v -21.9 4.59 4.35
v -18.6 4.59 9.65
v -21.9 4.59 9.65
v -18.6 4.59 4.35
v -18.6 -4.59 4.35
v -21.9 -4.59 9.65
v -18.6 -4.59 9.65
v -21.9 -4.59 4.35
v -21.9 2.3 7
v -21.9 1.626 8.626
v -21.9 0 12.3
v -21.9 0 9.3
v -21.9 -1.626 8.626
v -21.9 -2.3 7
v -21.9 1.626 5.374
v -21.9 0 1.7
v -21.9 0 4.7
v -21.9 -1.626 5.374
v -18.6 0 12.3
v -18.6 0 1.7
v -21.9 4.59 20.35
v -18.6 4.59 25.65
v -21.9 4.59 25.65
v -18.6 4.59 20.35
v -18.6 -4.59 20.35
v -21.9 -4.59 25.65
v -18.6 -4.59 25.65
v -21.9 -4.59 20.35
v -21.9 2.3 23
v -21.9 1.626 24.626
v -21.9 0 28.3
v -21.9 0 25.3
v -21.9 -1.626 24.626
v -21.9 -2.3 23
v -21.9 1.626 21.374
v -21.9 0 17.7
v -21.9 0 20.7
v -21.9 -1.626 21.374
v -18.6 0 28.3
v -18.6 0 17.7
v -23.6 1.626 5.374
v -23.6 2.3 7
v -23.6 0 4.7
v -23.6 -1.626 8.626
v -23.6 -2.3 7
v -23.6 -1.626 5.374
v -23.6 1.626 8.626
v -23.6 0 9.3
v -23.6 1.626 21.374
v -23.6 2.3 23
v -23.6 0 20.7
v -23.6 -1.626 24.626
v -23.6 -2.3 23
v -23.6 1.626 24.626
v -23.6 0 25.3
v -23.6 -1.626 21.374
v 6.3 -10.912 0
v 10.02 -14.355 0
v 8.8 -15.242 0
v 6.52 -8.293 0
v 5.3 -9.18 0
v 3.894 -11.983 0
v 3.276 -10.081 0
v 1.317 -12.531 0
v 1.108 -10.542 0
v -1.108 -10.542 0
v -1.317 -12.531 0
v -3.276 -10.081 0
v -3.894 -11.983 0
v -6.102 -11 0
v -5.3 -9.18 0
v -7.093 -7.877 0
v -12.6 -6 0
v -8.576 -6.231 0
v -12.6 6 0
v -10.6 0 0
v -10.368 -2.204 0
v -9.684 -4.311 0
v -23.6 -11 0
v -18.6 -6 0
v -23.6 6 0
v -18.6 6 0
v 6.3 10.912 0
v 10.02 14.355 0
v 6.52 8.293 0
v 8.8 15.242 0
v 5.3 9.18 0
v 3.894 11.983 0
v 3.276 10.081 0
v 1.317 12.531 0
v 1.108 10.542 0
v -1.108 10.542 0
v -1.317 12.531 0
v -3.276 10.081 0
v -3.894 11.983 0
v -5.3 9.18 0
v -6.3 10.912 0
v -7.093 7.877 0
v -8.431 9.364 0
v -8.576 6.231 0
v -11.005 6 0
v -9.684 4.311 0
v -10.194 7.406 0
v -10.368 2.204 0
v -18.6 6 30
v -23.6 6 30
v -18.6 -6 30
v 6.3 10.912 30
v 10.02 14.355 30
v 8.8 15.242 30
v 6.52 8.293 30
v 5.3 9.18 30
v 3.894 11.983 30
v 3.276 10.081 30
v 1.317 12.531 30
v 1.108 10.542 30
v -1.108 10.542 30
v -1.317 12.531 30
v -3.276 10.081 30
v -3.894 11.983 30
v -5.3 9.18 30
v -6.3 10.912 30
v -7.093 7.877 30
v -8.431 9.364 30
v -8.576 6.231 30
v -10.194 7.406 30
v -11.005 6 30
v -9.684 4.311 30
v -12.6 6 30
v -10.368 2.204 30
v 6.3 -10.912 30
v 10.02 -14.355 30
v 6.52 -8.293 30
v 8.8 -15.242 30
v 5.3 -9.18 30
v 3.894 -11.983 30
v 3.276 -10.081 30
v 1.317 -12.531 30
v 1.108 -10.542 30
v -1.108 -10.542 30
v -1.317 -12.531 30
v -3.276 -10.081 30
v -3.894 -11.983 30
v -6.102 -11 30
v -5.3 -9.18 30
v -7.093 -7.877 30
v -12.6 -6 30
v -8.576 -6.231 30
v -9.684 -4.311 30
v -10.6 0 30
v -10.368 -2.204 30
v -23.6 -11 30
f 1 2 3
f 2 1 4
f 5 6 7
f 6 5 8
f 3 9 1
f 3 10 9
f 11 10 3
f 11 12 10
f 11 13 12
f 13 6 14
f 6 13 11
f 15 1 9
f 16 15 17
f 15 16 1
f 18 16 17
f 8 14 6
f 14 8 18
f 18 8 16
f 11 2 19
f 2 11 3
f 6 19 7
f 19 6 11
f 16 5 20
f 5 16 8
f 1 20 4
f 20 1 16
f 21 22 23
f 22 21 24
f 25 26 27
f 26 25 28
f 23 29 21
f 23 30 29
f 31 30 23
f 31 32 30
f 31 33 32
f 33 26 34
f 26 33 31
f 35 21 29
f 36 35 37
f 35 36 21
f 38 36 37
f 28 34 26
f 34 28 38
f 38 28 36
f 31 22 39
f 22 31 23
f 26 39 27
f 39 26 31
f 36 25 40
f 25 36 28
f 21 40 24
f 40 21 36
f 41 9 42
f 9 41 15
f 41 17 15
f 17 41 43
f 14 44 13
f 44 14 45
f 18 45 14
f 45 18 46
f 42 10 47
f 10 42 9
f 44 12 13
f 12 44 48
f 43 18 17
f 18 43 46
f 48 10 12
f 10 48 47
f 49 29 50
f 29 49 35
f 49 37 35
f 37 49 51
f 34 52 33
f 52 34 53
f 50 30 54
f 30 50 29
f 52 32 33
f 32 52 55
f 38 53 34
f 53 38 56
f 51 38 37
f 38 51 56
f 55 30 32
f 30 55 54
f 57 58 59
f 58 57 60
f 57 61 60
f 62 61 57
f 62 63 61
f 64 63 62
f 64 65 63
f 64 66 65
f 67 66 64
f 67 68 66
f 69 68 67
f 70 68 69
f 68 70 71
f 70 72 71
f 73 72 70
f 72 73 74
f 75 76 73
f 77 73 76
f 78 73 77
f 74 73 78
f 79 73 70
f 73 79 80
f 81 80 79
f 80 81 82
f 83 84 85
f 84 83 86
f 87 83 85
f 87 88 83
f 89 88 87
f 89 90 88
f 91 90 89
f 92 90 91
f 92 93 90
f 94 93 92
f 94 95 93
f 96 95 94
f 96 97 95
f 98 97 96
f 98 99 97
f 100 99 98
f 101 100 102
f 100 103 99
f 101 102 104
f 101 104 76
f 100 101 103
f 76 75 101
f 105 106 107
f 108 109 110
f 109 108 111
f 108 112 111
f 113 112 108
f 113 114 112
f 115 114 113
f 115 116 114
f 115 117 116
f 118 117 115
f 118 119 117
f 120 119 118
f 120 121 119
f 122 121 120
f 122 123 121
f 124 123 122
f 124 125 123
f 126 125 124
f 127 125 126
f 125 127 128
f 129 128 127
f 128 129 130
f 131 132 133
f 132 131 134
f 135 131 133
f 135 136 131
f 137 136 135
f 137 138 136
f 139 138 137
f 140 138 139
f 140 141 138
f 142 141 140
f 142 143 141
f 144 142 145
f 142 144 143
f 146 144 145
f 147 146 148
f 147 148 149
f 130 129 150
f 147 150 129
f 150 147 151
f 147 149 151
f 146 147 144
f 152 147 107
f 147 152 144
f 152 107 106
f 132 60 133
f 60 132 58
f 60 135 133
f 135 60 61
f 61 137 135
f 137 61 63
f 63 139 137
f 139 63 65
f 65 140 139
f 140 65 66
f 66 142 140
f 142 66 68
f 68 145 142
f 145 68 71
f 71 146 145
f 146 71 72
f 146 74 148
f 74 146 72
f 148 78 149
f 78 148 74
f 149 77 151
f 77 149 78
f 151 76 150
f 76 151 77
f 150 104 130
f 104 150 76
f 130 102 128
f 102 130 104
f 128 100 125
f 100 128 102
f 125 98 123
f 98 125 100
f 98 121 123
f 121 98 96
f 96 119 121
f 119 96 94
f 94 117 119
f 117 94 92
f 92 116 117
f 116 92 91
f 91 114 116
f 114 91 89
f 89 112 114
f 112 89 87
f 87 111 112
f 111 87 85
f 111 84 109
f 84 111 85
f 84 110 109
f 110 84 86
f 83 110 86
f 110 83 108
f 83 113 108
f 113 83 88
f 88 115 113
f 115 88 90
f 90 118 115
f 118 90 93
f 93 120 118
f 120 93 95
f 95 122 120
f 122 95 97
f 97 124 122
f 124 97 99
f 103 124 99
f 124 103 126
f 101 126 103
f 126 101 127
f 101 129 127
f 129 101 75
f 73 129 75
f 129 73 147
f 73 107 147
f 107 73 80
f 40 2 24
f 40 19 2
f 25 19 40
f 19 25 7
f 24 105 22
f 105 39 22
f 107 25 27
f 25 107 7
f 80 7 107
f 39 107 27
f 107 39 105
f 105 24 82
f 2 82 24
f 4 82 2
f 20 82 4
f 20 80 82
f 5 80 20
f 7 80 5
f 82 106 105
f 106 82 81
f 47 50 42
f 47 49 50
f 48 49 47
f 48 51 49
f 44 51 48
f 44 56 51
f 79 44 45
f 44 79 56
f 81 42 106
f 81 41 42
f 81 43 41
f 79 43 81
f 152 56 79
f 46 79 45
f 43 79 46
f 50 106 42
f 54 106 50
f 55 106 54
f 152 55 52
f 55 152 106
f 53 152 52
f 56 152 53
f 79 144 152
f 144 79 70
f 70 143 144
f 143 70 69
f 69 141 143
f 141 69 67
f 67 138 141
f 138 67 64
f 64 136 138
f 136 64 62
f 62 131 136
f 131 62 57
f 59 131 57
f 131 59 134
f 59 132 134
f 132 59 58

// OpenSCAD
// [FL_INDEX: keywords="openscad, 3d_parametric, Clamp-on_Hardhat_Flashlight_Clip, csg_solid" | COT="Parametric OpenSCAD design from 3DCodeverse"]
// Title: Clamp-on Hardhat Flashlight Clip

//overall width of clip, in mm, measure hardhat slot, 25mm minimum
clip_width=30; 

//Diameter of flashlight, in mm, 21.2 for Sipik SK-68 cloen
diam=21.2;

//Thickness of clip, in mm
thickness=2;

//length of release tab, in mm
release_tab_length=5;

//size of nut trap, 6mm max
nut_trap_size=5.3;

//size of screw holes
screw_hole_size=4.6;

module insertion_tabs() //tabs at mouth of clip (draws a big wide triangle
{
polygon([[0,0],[50,50*sqrt(3)],[50,-50*sqrt(3)]],[[0,1,2]]);
}

module insertion_tabs_trim() //trims off big triangle leaving the two tabs
{
translate([(thickness/2)*sqrt(3),0])
{
polygon([[0,0],[50,50*sqrt(3)],[50,-50*sqrt(3)]],[[0,1,2]]);
}
difference()
{
circle(r=100);
circle(r=(diam/2)+thickness+release_tab_length);
}
}




module clamp() //draws clamp section
translate([-(diam/2)-thickness,-2.5,0])
{
difference()
{
square([22,17],center=true);
translate([-3,2.5,0])
{
square([6,12],center=true);
}
}
}


module nut_trap()
{
union()
{
translate([-(diam/2)-thickness-6-3.3,0,7])
{
rotate(90,[0,1,0])
{
linear_extrude(height=3.4)
{
circle(r=nut_trap_size,$fn=6);
}
}
}

translate([-(diam/2)-thickness-6-3.3,0,clip_width-7])
{
rotate(90,[0,1,0])
{
linear_extrude(height=3.4)
{
circle(r=nut_trap_size,$fn=6);
}
}
}
}
}


module clamp_holes()
{
union()
{
translate([-(diam/2)-thickness-6-6,0,7])
{
rotate(90,[0,1,0])
{
linear_extrude(height=6)
{
#circle(r=screw_hole_size/2);
}
}
}

translate([-(diam/2)-thickness-6-6,0,clip_width-7])
{
rotate(90,[0,1,0])
{
linear_extrude(height=6)
{
#circle(r=screw_hole_size/2);
}
}
}
}
}



//main body
difference()
{
linear_extrude(height=clip_width)
{
union()
{
difference()
	{
		union()
		{
			circle(r=(diam/2)+thickness);
			insertion_tabs();
			
		}	
		insertion_tabs_trim();
		circle(r=(diam/2));
	}
difference()
{
clamp();
circle(r=(diam/2));
}
}
}
nut_trap();
clamp_holes();
}
